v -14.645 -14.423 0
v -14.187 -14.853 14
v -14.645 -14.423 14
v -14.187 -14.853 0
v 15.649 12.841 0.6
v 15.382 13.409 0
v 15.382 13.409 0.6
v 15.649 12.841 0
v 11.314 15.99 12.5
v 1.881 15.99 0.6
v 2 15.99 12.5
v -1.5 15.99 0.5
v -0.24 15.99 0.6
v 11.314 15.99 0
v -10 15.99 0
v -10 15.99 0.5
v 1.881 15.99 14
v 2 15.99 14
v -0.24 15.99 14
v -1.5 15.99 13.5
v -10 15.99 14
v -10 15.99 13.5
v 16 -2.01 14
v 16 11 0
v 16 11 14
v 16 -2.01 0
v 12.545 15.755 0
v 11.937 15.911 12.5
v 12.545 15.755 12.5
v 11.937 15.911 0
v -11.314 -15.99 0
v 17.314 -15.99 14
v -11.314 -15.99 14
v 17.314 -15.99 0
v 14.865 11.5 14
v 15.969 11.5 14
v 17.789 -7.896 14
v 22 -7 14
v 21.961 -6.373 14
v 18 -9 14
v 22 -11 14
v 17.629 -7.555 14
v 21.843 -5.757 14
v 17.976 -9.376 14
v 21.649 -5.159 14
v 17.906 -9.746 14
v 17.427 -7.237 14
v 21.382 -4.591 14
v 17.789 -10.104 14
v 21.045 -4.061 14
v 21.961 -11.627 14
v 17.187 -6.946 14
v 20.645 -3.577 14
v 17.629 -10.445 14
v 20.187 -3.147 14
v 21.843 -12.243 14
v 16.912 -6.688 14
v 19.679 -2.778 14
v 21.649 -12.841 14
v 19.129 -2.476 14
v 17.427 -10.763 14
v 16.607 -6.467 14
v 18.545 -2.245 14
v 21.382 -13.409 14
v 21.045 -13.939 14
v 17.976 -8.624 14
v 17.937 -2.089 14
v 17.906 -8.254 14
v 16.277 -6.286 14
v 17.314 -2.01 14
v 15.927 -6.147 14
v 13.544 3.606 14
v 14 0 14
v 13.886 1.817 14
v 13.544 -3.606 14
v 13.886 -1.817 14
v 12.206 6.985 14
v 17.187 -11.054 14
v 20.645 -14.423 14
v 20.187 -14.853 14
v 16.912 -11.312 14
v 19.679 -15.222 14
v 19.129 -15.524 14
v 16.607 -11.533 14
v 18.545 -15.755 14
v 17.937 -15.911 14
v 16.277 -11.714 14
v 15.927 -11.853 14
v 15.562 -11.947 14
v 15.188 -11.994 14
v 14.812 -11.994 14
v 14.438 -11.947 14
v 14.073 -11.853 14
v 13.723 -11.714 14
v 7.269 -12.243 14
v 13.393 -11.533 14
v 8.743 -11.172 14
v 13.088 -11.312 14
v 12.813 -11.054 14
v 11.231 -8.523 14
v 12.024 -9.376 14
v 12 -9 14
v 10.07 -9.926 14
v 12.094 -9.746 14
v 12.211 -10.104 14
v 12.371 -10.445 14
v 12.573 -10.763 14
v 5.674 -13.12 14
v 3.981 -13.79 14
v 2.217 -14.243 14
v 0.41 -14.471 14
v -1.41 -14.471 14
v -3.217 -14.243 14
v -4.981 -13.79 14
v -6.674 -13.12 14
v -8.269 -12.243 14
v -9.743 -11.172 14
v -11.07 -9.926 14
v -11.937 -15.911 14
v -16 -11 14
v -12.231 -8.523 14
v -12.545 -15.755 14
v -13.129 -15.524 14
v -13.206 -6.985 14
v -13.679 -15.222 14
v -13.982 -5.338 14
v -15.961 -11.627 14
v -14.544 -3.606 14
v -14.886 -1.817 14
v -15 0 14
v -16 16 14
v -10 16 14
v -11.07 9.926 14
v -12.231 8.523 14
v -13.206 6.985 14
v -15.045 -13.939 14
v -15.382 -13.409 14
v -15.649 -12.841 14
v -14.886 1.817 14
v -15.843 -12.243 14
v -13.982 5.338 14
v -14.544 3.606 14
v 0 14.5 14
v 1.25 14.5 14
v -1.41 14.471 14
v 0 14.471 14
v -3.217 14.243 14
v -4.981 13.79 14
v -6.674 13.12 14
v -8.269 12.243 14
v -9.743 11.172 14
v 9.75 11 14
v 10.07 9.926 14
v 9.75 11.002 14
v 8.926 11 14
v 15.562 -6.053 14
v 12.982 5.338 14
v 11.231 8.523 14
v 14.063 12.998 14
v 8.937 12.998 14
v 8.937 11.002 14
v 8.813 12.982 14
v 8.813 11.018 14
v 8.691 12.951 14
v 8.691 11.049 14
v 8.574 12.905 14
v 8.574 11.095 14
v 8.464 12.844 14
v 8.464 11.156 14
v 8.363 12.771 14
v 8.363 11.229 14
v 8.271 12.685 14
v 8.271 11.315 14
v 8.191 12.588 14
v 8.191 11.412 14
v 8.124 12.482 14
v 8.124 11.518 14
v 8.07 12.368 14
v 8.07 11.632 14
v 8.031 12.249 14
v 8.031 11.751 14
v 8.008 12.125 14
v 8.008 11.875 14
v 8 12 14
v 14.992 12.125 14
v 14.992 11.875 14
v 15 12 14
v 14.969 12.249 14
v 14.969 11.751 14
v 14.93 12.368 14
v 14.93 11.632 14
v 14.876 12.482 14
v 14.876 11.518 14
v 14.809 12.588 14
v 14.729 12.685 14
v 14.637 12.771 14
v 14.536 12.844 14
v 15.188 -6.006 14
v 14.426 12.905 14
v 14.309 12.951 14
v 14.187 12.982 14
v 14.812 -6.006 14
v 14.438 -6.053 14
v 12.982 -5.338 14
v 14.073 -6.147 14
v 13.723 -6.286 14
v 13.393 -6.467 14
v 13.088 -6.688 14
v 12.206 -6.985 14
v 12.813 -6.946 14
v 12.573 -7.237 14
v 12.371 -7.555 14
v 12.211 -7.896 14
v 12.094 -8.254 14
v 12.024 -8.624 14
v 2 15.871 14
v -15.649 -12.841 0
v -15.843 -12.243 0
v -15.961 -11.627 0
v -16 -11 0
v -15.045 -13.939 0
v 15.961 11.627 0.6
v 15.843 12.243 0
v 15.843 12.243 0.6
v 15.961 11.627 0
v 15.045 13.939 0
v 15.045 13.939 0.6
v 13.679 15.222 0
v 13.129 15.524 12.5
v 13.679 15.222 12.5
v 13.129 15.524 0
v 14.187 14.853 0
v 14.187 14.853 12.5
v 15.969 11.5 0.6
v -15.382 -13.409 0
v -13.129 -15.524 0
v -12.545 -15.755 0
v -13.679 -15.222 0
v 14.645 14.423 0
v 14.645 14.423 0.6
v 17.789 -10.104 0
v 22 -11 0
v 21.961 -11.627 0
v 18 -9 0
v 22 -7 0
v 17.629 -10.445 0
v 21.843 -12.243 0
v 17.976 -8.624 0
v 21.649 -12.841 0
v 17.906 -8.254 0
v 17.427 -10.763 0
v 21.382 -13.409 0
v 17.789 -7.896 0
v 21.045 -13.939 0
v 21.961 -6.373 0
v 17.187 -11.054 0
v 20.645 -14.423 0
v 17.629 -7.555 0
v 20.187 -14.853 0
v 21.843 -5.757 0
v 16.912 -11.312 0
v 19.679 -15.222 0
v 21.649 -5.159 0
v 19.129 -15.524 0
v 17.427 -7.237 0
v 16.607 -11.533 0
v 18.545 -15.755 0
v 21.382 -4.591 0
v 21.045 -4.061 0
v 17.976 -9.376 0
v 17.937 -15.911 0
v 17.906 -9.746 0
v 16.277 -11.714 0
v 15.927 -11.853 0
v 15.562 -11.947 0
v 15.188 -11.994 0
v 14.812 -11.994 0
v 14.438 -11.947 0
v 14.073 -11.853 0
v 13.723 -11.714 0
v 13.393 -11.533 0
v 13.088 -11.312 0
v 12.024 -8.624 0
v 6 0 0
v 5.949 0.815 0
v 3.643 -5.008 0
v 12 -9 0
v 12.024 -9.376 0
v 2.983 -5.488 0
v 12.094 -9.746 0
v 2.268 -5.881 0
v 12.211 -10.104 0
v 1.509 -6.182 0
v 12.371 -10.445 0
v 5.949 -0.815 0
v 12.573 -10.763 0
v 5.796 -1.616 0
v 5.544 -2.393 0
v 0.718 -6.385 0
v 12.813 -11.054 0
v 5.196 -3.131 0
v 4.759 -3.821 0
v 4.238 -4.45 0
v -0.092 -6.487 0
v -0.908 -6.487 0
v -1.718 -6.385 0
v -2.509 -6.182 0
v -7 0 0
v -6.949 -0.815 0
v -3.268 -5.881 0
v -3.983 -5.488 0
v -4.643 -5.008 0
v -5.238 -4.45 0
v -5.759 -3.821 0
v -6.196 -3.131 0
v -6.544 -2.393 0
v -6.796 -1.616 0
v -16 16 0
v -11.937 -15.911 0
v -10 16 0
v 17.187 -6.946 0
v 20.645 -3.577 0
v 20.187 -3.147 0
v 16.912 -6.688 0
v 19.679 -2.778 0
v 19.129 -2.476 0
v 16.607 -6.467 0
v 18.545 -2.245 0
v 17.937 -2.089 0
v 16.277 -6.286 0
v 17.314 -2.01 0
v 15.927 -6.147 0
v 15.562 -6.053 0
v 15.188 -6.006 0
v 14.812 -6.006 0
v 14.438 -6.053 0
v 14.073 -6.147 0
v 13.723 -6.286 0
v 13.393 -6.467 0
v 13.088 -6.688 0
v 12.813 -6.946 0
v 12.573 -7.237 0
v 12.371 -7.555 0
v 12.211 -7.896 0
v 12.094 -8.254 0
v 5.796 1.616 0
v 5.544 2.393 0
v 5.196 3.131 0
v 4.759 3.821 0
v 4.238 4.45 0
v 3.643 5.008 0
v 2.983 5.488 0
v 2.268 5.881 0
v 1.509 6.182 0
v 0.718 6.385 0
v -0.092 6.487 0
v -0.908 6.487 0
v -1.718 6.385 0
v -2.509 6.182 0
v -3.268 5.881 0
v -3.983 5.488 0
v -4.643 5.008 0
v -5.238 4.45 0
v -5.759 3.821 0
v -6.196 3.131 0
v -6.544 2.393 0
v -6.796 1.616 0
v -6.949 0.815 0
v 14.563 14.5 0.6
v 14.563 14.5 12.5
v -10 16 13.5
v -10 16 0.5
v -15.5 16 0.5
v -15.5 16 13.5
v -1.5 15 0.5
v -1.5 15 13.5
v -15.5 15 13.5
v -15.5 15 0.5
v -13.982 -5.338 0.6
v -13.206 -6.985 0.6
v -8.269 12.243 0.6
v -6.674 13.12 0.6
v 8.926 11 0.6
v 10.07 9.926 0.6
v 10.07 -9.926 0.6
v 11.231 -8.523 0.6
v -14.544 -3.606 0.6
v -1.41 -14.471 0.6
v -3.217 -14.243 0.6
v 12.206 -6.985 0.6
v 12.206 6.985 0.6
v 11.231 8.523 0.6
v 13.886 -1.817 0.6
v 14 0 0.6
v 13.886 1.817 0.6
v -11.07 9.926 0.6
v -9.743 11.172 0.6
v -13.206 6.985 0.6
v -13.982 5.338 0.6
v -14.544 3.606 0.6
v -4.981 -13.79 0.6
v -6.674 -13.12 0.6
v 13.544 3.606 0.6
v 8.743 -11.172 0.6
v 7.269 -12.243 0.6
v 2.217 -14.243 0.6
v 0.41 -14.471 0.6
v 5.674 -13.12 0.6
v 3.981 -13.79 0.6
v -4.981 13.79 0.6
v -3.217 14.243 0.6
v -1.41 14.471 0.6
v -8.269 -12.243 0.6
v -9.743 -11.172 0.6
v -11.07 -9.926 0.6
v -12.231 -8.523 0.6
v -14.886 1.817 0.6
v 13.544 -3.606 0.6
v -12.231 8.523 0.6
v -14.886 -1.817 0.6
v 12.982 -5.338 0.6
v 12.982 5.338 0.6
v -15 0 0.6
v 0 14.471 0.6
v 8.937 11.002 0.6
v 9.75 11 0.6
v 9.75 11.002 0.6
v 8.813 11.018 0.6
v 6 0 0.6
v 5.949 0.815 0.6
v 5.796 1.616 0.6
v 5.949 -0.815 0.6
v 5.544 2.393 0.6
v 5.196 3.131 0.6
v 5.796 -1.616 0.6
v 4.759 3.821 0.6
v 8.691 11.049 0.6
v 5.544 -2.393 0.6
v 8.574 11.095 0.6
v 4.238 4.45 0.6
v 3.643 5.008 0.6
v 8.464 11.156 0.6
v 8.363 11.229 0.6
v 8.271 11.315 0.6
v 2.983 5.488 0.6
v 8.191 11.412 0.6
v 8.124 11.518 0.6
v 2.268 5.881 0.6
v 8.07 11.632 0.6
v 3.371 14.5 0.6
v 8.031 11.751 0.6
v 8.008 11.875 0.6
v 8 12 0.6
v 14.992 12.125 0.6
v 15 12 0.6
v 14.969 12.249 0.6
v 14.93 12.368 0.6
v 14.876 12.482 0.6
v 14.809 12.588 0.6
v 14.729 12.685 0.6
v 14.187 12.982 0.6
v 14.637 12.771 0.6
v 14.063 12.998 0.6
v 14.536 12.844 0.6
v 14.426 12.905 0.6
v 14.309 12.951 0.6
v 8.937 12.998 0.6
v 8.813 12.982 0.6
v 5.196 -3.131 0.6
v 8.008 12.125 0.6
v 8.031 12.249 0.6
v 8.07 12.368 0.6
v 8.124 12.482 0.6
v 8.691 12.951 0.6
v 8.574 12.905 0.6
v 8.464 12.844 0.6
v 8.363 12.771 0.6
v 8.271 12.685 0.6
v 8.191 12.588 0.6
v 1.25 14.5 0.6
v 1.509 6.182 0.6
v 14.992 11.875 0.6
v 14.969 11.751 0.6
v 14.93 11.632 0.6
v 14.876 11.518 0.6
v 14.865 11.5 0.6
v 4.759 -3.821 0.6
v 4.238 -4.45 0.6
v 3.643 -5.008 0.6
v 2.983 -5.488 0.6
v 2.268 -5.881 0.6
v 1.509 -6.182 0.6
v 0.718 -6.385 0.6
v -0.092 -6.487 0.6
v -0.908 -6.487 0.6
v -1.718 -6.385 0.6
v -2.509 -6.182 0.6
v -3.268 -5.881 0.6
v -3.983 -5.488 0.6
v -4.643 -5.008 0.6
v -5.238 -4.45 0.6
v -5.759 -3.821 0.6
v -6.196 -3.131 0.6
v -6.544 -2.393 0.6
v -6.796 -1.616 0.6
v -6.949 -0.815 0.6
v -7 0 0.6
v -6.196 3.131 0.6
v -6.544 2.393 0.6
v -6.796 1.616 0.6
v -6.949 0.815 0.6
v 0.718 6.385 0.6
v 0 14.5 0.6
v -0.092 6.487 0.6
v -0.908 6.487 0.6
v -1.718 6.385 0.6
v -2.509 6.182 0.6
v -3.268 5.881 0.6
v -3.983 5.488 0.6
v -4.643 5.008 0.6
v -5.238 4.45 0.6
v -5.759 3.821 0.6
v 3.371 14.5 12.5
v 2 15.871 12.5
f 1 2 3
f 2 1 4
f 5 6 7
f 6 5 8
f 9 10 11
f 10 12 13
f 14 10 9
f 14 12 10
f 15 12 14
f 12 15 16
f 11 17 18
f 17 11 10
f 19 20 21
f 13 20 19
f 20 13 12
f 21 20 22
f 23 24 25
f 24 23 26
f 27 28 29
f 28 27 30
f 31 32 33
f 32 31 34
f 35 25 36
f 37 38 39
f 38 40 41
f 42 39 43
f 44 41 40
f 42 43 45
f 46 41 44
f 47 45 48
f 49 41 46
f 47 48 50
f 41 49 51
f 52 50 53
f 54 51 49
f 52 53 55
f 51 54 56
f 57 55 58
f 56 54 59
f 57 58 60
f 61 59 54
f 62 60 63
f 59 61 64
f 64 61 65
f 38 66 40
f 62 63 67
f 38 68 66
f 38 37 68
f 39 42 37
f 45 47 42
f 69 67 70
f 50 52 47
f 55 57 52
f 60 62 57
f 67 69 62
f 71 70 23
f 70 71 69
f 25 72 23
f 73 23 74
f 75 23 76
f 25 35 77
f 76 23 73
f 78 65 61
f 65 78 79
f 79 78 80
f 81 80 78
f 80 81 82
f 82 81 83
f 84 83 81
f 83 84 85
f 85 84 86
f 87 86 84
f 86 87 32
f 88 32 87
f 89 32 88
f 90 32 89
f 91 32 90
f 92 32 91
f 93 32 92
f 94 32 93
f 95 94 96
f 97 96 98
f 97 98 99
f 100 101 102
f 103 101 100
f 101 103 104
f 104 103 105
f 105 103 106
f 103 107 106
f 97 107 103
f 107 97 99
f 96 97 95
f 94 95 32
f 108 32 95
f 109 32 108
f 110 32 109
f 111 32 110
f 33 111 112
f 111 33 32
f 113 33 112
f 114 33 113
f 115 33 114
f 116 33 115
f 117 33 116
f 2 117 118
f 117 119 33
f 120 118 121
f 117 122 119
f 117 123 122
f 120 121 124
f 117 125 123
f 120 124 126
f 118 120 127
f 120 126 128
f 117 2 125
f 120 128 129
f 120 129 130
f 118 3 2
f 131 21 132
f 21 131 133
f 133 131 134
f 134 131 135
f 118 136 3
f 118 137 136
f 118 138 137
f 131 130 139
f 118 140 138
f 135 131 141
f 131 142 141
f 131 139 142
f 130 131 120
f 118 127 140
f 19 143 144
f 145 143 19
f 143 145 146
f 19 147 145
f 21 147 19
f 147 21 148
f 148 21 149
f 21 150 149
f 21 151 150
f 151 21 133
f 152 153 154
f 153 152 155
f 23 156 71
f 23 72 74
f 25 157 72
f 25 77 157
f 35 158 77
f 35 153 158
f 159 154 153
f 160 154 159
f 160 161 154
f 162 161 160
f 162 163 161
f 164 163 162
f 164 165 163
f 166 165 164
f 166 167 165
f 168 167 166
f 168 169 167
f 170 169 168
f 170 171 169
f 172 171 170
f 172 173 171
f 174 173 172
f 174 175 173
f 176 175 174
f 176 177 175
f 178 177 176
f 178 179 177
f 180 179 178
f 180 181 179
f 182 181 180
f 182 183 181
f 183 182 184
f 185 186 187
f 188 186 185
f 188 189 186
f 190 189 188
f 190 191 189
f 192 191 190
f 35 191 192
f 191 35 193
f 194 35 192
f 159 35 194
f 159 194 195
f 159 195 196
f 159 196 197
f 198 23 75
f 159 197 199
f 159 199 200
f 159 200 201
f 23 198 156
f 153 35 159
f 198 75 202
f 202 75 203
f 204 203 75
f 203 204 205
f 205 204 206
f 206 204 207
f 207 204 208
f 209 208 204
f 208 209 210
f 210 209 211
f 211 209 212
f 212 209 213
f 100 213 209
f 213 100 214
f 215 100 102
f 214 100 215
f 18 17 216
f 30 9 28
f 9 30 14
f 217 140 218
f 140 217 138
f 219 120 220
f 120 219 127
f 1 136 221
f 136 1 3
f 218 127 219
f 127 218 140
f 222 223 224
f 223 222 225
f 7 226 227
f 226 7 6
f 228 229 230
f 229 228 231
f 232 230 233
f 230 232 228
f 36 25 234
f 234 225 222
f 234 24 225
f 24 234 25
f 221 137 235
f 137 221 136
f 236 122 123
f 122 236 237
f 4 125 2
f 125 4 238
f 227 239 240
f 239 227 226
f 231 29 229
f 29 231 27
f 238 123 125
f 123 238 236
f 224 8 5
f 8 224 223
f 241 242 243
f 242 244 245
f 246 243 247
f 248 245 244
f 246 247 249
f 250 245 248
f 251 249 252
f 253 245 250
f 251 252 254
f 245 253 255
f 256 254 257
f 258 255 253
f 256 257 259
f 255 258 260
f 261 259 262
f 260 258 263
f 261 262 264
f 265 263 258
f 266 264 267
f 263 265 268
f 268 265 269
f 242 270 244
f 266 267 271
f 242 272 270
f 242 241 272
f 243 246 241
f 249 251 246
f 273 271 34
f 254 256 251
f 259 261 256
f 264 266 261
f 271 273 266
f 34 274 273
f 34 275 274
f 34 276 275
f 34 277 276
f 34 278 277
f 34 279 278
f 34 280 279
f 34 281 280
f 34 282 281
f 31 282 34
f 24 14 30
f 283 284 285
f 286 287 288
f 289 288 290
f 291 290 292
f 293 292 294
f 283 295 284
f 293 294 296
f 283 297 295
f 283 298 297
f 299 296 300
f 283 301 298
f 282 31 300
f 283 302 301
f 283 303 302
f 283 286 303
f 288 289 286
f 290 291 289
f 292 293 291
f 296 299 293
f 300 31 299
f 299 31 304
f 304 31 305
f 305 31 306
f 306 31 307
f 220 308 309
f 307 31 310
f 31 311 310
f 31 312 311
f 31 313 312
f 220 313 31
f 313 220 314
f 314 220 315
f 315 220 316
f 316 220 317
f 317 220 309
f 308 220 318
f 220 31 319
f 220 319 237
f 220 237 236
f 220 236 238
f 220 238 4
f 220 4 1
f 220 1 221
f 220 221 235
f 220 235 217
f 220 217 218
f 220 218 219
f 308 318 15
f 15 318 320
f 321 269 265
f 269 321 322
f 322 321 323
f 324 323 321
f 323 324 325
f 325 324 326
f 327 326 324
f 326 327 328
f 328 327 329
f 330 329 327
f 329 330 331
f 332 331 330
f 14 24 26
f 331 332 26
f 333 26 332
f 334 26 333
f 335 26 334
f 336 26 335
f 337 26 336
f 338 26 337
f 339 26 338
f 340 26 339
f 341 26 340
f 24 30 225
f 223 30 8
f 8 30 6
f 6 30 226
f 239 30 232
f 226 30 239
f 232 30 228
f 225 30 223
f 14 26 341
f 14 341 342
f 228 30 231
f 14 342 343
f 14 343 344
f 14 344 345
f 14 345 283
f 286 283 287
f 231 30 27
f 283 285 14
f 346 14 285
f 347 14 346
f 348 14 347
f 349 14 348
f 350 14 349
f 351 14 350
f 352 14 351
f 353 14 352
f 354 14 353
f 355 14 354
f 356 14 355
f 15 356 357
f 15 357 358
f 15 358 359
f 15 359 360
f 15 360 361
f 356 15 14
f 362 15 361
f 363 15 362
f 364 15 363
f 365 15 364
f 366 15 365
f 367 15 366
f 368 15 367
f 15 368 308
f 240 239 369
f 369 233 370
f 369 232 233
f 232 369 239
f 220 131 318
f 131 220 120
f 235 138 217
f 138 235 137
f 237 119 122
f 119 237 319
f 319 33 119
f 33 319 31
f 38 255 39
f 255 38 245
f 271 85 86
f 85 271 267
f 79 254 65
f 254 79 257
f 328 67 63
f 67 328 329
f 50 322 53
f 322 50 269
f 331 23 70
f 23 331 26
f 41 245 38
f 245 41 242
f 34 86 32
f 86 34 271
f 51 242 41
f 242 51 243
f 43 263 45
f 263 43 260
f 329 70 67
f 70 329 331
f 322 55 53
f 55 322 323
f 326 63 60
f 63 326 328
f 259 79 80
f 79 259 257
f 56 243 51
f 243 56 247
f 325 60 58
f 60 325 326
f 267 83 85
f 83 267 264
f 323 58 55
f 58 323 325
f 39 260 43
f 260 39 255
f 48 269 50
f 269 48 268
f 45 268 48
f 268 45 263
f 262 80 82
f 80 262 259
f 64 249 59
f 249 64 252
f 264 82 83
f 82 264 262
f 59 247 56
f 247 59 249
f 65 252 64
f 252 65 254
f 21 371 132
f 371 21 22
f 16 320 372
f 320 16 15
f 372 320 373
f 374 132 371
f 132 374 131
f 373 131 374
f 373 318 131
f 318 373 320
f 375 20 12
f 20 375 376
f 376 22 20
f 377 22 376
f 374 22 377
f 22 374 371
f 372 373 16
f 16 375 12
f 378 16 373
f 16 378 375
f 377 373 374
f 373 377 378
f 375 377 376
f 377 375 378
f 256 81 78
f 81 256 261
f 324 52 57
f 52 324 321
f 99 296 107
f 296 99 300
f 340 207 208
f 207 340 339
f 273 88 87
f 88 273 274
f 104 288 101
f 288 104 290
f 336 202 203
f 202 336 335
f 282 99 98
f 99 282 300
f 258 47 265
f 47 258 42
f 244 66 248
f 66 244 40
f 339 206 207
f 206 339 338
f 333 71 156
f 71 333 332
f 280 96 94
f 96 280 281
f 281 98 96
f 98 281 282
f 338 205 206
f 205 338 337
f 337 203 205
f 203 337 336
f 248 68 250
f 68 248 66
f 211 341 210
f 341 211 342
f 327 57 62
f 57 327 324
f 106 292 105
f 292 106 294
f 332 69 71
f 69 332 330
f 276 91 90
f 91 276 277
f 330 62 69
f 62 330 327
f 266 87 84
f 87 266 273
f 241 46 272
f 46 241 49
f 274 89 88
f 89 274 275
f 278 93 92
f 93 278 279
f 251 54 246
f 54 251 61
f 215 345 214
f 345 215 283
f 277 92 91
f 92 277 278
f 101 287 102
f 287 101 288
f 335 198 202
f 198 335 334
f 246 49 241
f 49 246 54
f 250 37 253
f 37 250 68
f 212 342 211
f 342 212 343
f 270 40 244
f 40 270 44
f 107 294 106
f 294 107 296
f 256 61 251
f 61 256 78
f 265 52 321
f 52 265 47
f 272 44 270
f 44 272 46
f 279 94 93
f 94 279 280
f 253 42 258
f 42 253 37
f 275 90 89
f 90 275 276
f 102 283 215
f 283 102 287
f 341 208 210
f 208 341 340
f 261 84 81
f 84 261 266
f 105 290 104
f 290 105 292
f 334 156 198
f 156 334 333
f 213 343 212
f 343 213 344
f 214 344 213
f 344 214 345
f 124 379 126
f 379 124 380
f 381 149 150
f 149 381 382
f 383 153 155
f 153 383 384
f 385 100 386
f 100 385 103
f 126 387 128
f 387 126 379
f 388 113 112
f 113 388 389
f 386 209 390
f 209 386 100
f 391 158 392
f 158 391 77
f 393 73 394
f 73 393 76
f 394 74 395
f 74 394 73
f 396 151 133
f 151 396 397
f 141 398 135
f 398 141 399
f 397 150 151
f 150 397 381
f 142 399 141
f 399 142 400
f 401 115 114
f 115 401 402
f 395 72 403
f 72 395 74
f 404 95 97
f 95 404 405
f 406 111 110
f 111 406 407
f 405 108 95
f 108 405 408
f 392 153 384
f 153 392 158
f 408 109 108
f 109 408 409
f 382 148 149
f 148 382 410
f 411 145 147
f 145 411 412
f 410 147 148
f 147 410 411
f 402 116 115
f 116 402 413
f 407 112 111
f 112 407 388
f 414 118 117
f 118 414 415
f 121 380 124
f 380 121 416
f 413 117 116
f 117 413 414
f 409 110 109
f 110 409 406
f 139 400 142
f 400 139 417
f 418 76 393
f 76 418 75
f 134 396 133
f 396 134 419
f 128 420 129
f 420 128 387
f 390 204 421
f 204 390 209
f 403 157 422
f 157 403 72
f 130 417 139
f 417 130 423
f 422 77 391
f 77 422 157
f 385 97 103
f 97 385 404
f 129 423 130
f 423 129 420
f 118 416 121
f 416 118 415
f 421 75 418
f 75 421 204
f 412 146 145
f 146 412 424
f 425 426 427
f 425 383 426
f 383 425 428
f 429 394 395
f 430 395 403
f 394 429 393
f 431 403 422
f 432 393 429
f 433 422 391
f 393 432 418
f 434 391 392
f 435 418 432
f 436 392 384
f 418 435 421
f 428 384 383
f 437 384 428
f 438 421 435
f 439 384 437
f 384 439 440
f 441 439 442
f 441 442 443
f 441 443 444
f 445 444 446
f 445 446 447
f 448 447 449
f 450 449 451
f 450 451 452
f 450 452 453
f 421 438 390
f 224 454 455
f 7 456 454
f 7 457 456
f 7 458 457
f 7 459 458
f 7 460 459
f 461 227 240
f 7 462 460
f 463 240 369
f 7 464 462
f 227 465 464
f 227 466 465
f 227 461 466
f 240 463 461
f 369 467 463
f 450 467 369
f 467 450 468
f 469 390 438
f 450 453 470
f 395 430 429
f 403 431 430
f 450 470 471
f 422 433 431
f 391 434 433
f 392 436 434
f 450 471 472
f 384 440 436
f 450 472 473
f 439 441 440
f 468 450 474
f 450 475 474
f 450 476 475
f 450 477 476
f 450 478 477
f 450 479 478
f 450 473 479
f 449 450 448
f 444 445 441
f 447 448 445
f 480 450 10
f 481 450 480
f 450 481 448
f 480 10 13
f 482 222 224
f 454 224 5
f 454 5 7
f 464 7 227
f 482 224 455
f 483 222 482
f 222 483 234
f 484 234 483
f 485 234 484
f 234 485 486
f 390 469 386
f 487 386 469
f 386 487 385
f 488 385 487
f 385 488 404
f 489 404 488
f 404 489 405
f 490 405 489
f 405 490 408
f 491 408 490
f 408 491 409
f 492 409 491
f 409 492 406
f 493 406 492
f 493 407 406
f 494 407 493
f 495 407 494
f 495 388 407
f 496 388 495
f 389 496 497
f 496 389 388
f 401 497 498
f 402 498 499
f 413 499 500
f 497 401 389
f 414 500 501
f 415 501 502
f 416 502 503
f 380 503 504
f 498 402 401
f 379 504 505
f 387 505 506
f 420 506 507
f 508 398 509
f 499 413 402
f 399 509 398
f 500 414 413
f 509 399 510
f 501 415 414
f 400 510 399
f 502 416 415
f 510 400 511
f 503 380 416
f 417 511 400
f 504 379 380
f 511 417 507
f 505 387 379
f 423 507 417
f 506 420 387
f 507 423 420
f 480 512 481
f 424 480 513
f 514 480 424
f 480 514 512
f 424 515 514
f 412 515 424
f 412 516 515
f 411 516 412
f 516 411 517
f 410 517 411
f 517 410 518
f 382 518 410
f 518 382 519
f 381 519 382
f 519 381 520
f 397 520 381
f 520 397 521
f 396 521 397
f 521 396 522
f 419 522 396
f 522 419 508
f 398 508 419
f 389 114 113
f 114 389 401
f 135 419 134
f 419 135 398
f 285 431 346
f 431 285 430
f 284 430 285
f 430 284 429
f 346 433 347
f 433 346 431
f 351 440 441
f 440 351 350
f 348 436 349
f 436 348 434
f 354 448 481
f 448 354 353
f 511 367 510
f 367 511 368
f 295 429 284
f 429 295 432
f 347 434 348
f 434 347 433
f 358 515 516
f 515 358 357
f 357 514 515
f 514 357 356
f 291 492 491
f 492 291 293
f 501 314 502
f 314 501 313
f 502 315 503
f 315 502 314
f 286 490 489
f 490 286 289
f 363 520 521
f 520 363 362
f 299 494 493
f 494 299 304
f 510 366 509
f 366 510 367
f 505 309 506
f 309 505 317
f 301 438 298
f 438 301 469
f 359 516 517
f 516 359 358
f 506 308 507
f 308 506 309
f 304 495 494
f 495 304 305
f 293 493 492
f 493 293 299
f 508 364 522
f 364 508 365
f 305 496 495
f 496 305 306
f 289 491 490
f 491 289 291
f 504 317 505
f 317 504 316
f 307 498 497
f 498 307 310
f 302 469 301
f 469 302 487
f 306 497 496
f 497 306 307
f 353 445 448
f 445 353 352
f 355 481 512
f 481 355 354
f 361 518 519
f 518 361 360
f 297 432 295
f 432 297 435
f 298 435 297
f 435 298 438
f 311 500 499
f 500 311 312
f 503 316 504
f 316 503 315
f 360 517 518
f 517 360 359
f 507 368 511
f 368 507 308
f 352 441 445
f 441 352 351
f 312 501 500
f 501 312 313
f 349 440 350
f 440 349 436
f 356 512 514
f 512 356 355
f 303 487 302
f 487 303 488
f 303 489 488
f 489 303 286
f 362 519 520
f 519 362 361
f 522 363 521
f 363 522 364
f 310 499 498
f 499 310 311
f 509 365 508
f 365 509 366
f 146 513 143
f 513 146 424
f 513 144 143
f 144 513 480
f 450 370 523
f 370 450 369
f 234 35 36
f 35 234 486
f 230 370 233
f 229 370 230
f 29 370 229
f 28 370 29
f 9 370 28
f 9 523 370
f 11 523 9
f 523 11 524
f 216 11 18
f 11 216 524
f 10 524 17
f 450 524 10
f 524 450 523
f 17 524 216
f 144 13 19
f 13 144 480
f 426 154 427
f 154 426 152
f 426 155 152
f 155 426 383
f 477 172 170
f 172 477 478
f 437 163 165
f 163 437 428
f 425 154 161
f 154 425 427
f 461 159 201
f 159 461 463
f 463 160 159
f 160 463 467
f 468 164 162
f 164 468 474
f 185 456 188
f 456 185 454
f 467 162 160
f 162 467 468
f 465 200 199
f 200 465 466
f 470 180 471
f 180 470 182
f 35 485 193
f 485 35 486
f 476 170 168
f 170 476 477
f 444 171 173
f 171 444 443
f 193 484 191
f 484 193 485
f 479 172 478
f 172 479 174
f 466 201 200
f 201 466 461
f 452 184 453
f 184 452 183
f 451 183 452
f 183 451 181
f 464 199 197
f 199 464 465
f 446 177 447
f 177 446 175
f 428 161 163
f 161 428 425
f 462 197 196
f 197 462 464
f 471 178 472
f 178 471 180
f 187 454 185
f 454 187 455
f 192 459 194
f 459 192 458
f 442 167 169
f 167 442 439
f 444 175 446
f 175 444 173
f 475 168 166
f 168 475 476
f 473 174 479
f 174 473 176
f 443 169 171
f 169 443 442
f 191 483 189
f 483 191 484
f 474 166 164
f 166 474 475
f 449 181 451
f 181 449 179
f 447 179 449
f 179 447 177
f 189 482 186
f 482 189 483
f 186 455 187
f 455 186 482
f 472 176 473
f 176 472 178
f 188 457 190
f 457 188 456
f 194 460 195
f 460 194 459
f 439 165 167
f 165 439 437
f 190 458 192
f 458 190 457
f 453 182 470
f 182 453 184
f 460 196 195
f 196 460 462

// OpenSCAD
$fn = 50;


union() {
	difference() {
		union() {
			translate(v = [0, 0, 0]) {
				rotate(a = [0, 0, 0]) {
					hull() {
						translate(v = [-11.0000000000, 11.0000000000, 0]) {
							rotate(a = [0, 0, 0]) {
								translate(v = [0, 0, 0]) {
									rotate(a = [0, 0, 0]) {
										cylinder(h = 14, r = 5);
									}
								}
							}
						}
						translate(v = [11.0000000000, 11.0000000000, 0]) {
							rotate(a = [0, 0, 0]) {
								translate(v = [0, 0, 0]) {
									rotate(a = [0, 0, 0]) {
										cylinder(h = 14, r = 5);
									}
								}
							}
						}
						translate(v = [-11.0000000000, -11.0000000000, 0]) {
							rotate(a = [0, 0, 0]) {
								translate(v = [0, 0, 0]) {
									rotate(a = [0, 0, 0]) {
										cylinder(h = 14, r = 5);
									}
								}
							}
						}
						translate(v = [11.0000000000, -11.0000000000, 0]) {
							rotate(a = [0, 0, 0]) {
								translate(v = [0, 0, 0]) {
									rotate(a = [0, 0, 0]) {
										cylinder(h = 14, r = 5);
									}
								}
							}
						}
					}
				}
			}
			translate(v = [7.5000000000, -9.0000000000, 0]) {
				rotate(a = [0, 0, 0]) {
					hull() {
						translate(v = [-9.5000000000, 2.0000000000, 0]) {
							rotate(a = [0, 0, 0]) {
								translate(v = [0, 0, 0]) {
									rotate(a = [0, 0, 0]) {
										cylinder(h = 14, r = 5);
									}
								}
							}
						}
						translate(v = [9.5000000000, 2.0000000000, 0]) {
							rotate(a = [0, 0, 0]) {
								translate(v = [0, 0, 0]) {
									rotate(a = [0, 0, 0]) {
										cylinder(h = 14, r = 5);
									}
								}
							}
						}
						translate(v = [-9.5000000000, -2.0000000000, 0]) {
							rotate(a = [0, 0, 0]) {
								translate(v = [0, 0, 0]) {
									rotate(a = [0, 0, 0]) {
										cylinder(h = 14, r = 5);
									}
								}
							}
						}
						translate(v = [9.5000000000, -2.0000000000, 0]) {
							rotate(a = [0, 0, 0]) {
								translate(v = [0, 0, 0]) {
									rotate(a = [0, 0, 0]) {
										cylinder(h = 14, r = 5);
									}
								}
							}
						}
					}
				}
			}
			translate(v = [-16.0000000000, 10.0000000000, 0]) {
				rotate(a = [0, 0, 0]) {
					cube(size = [6, 6, 14]);
				}
			}
		}
		union() {
			translate(v = [-15.5000000000, 15.0000000000, 0.5000000000]) {
				rotate(a = [0, 0, 0]) {
					cube(size = [14, 1, 13.0000000000]);
				}
			}
			translate(v = [15.0000000000, -9.0000000000, -125.0000000000]) {
				rotate(a = [0, 0, 0]) {
					cylinder(h = 250, r = 3.0000000000);
				}
			}
			translate(v = [-0.5000000000, 0.0000000000, 0.6000000000]) {
				rotate(a = [0, 0, 0]) {
					cylinder(h = 16.4000000000, r = 14.5000000000);
				}
			}
			translate(v = [-0.5000000000, 0.0000000000, -7.0000000000]) {
				rotate(a = [0, 0, 0]) {
					cylinder(h = 14, r = 6.5000000000);
				}
			}
			translate(v = [0.0000000000, 11.5000000000, 0.6000000000]) {
				rotate(a = [0, 0, 0]) {
					cube(size = [16.0000000000, 3, 16.4000000000]);
				}
			}
			translate(v = [2.0000000000, 11.5000000000, 12.5000000000]) {
				rotate(a = [0, 0, 0]) {
					cube(size = [14.0000000000, 6, 1.5000000000]);
				}
			}
			translate(v = [-3.0000000000, 18.7500000000, 0.6000000000]) {
				rotate(a = [0, 0, -45]) {
					cube(size = [10, 1.5000000000, 16.4000000000]);
				}
			}
			translate(v = [2.2500000000, 11.0000000000, 0.6000000000]) {
				rotate(a = [0, 0, 0]) {
					cube(size = [7.5000000000, 2, 13.4000000000]);
				}
			}
		}
	}
	union() {
		translate(v = [11.5000000000, 12, 0]) {
			rotate(a = [0, 0, 0]) {
				hull() {
					translate(v = [2.5000000000, 0, 0]) {
						rotate(a = [0, 0, 0]) {
							translate(v = [0, 0, 0]) {
								rotate(a = [0, 0, 0]) {
									cylinder(h = 14, r = 1.0000000000);
								}
							}
						}
					}
					translate(v = [-2.5000000000, 0, 0]) {
						rotate(a = [0, 0, 0]) {
							translate(v = [0, 0, 0]) {
								rotate(a = [0, 0, 0]) {
									cylinder(h = 14, r = 1.0000000000);
								}
							}
						}
					}
				}
			}
		}
	}
}
